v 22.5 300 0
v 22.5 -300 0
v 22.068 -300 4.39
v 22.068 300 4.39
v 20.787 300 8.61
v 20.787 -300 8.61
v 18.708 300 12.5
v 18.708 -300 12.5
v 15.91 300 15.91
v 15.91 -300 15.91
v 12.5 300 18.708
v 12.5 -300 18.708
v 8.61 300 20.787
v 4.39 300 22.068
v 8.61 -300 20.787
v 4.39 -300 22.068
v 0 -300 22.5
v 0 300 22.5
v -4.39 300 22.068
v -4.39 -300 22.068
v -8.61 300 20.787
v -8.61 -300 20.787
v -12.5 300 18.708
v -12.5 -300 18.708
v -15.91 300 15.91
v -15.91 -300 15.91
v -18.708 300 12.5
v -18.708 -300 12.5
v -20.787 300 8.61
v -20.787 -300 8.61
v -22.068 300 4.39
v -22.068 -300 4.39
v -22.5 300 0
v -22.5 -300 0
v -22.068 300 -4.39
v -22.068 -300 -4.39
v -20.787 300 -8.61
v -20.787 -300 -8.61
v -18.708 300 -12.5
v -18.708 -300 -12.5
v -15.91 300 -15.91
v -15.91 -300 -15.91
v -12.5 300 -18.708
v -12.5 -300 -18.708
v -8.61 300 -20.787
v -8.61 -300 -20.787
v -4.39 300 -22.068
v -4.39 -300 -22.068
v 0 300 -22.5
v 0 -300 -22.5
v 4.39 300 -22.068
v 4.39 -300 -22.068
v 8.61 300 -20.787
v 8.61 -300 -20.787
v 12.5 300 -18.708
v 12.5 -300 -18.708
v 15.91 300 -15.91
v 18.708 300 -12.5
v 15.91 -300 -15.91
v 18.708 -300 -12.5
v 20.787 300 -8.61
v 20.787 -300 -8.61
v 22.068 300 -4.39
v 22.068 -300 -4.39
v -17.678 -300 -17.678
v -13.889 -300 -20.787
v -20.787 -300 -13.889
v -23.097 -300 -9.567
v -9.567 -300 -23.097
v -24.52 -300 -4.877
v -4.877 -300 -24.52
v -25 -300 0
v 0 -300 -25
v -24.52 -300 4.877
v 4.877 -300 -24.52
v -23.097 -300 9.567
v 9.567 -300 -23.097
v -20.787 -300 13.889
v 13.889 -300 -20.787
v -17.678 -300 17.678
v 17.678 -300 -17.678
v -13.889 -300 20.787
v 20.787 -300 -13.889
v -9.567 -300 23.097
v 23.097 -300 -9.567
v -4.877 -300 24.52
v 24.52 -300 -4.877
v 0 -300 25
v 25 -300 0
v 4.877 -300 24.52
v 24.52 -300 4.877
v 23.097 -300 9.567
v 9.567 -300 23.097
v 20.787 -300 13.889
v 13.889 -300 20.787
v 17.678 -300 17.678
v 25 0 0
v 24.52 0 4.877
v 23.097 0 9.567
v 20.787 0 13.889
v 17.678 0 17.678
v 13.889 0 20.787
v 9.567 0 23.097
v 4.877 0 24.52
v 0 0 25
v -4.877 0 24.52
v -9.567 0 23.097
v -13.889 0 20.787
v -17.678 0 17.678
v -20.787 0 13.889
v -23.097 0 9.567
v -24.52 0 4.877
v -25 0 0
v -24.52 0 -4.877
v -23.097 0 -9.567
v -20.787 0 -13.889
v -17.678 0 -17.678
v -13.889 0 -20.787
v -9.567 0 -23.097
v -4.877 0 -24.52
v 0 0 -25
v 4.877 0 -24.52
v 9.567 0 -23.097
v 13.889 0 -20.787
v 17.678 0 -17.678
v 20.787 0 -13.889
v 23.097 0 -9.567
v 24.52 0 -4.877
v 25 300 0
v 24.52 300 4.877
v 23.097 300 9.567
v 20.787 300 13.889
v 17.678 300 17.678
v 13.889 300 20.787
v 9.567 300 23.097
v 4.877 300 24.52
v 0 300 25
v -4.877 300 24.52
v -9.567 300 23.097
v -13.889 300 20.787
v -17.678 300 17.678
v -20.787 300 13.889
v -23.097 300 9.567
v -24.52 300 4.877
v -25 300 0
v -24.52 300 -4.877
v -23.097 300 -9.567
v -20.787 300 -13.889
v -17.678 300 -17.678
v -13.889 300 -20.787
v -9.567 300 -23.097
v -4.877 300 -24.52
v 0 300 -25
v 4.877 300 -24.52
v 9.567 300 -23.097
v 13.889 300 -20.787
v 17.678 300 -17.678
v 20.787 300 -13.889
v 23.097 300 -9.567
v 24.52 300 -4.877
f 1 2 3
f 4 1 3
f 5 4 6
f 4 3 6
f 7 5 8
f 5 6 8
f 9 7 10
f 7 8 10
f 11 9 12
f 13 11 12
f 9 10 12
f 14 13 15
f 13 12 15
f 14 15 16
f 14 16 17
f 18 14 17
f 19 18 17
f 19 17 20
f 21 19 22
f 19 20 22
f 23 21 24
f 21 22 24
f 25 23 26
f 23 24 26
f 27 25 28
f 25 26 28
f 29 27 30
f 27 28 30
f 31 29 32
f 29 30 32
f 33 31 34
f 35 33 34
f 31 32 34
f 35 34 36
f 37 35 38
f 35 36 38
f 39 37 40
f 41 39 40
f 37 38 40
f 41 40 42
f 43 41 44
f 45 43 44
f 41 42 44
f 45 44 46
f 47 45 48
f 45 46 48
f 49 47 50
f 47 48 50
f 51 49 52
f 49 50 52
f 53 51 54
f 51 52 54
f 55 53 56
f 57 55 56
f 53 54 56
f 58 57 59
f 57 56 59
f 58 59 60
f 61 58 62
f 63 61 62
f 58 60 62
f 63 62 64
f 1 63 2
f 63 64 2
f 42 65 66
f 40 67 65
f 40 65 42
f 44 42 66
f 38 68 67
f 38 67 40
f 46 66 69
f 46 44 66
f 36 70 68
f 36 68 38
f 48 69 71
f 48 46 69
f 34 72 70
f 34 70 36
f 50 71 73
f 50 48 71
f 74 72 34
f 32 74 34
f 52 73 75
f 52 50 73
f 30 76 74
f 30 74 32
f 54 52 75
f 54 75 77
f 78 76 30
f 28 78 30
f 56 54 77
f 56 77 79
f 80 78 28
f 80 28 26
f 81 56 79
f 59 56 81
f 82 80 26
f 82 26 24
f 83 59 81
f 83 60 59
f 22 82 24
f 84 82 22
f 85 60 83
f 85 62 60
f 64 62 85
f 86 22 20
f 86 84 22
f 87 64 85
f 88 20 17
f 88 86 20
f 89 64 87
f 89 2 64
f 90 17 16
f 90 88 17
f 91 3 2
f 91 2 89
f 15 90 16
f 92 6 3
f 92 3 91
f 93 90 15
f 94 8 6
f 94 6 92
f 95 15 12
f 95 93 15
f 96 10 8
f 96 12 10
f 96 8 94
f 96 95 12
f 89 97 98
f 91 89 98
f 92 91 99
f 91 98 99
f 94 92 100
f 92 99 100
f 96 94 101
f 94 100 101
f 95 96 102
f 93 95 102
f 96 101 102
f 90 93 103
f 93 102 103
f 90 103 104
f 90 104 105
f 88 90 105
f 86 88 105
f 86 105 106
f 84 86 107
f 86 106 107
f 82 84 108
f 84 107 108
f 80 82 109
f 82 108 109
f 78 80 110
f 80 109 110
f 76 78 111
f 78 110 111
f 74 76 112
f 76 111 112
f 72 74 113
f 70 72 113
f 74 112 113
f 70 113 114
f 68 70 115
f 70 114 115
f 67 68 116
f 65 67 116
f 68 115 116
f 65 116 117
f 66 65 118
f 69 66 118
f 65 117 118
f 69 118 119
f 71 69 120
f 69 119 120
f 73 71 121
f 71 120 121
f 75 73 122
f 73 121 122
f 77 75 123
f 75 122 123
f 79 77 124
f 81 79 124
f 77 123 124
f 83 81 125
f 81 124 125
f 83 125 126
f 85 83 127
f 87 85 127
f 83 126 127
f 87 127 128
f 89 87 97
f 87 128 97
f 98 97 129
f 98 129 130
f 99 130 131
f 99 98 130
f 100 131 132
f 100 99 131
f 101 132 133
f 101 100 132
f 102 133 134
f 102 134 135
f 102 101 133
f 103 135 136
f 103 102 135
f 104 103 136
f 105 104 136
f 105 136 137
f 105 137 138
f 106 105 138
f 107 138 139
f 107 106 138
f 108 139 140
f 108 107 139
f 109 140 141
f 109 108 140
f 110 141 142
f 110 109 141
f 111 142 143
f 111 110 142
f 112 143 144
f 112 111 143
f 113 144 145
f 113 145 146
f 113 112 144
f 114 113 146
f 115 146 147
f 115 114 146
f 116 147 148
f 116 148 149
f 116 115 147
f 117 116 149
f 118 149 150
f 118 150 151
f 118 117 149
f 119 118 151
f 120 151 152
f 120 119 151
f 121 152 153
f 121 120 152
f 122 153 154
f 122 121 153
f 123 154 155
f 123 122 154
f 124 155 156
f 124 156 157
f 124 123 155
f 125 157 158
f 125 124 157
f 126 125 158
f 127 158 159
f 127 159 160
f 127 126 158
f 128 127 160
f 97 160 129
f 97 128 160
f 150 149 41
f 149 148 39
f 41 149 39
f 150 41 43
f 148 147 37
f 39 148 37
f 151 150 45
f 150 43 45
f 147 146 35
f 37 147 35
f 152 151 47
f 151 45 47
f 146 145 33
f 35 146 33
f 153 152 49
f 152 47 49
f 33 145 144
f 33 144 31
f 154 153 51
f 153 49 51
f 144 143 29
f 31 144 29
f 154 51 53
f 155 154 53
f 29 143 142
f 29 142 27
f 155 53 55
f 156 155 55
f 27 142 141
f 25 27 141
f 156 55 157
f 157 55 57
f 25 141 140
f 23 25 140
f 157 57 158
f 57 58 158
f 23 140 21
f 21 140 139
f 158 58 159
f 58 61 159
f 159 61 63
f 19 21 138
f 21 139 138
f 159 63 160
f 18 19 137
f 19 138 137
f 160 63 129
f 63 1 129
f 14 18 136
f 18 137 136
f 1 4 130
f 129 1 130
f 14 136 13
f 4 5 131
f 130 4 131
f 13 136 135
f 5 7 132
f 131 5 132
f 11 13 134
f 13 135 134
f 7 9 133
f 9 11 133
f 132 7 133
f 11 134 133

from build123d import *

# Parameters (mm, degrees)
F0_R     = 25
F1_DEPTH = 300
F3_R     = 22.5
F4_DEPTH = 600


with BuildPart() as f1:
    # F0 (on Front) → F1 (new body)
    with BuildSketch(Plane.XZ):
        Circle(F0_R)
    extrude(amount=-F1_DEPTH)

    # F2: F1 across face


with BuildPart() as f1_1:
    add(f1.part)
    add(f1.part.mirror(Plane.XZ))

    # F3 (on face) → F4 (cut)
    with BuildSketch(Plane.XZ.offset(300)):
        Circle(F3_R)
    extrude(amount=-F4_DEPTH, mode=Mode.SUBTRACT)


solid = f1_1.part
